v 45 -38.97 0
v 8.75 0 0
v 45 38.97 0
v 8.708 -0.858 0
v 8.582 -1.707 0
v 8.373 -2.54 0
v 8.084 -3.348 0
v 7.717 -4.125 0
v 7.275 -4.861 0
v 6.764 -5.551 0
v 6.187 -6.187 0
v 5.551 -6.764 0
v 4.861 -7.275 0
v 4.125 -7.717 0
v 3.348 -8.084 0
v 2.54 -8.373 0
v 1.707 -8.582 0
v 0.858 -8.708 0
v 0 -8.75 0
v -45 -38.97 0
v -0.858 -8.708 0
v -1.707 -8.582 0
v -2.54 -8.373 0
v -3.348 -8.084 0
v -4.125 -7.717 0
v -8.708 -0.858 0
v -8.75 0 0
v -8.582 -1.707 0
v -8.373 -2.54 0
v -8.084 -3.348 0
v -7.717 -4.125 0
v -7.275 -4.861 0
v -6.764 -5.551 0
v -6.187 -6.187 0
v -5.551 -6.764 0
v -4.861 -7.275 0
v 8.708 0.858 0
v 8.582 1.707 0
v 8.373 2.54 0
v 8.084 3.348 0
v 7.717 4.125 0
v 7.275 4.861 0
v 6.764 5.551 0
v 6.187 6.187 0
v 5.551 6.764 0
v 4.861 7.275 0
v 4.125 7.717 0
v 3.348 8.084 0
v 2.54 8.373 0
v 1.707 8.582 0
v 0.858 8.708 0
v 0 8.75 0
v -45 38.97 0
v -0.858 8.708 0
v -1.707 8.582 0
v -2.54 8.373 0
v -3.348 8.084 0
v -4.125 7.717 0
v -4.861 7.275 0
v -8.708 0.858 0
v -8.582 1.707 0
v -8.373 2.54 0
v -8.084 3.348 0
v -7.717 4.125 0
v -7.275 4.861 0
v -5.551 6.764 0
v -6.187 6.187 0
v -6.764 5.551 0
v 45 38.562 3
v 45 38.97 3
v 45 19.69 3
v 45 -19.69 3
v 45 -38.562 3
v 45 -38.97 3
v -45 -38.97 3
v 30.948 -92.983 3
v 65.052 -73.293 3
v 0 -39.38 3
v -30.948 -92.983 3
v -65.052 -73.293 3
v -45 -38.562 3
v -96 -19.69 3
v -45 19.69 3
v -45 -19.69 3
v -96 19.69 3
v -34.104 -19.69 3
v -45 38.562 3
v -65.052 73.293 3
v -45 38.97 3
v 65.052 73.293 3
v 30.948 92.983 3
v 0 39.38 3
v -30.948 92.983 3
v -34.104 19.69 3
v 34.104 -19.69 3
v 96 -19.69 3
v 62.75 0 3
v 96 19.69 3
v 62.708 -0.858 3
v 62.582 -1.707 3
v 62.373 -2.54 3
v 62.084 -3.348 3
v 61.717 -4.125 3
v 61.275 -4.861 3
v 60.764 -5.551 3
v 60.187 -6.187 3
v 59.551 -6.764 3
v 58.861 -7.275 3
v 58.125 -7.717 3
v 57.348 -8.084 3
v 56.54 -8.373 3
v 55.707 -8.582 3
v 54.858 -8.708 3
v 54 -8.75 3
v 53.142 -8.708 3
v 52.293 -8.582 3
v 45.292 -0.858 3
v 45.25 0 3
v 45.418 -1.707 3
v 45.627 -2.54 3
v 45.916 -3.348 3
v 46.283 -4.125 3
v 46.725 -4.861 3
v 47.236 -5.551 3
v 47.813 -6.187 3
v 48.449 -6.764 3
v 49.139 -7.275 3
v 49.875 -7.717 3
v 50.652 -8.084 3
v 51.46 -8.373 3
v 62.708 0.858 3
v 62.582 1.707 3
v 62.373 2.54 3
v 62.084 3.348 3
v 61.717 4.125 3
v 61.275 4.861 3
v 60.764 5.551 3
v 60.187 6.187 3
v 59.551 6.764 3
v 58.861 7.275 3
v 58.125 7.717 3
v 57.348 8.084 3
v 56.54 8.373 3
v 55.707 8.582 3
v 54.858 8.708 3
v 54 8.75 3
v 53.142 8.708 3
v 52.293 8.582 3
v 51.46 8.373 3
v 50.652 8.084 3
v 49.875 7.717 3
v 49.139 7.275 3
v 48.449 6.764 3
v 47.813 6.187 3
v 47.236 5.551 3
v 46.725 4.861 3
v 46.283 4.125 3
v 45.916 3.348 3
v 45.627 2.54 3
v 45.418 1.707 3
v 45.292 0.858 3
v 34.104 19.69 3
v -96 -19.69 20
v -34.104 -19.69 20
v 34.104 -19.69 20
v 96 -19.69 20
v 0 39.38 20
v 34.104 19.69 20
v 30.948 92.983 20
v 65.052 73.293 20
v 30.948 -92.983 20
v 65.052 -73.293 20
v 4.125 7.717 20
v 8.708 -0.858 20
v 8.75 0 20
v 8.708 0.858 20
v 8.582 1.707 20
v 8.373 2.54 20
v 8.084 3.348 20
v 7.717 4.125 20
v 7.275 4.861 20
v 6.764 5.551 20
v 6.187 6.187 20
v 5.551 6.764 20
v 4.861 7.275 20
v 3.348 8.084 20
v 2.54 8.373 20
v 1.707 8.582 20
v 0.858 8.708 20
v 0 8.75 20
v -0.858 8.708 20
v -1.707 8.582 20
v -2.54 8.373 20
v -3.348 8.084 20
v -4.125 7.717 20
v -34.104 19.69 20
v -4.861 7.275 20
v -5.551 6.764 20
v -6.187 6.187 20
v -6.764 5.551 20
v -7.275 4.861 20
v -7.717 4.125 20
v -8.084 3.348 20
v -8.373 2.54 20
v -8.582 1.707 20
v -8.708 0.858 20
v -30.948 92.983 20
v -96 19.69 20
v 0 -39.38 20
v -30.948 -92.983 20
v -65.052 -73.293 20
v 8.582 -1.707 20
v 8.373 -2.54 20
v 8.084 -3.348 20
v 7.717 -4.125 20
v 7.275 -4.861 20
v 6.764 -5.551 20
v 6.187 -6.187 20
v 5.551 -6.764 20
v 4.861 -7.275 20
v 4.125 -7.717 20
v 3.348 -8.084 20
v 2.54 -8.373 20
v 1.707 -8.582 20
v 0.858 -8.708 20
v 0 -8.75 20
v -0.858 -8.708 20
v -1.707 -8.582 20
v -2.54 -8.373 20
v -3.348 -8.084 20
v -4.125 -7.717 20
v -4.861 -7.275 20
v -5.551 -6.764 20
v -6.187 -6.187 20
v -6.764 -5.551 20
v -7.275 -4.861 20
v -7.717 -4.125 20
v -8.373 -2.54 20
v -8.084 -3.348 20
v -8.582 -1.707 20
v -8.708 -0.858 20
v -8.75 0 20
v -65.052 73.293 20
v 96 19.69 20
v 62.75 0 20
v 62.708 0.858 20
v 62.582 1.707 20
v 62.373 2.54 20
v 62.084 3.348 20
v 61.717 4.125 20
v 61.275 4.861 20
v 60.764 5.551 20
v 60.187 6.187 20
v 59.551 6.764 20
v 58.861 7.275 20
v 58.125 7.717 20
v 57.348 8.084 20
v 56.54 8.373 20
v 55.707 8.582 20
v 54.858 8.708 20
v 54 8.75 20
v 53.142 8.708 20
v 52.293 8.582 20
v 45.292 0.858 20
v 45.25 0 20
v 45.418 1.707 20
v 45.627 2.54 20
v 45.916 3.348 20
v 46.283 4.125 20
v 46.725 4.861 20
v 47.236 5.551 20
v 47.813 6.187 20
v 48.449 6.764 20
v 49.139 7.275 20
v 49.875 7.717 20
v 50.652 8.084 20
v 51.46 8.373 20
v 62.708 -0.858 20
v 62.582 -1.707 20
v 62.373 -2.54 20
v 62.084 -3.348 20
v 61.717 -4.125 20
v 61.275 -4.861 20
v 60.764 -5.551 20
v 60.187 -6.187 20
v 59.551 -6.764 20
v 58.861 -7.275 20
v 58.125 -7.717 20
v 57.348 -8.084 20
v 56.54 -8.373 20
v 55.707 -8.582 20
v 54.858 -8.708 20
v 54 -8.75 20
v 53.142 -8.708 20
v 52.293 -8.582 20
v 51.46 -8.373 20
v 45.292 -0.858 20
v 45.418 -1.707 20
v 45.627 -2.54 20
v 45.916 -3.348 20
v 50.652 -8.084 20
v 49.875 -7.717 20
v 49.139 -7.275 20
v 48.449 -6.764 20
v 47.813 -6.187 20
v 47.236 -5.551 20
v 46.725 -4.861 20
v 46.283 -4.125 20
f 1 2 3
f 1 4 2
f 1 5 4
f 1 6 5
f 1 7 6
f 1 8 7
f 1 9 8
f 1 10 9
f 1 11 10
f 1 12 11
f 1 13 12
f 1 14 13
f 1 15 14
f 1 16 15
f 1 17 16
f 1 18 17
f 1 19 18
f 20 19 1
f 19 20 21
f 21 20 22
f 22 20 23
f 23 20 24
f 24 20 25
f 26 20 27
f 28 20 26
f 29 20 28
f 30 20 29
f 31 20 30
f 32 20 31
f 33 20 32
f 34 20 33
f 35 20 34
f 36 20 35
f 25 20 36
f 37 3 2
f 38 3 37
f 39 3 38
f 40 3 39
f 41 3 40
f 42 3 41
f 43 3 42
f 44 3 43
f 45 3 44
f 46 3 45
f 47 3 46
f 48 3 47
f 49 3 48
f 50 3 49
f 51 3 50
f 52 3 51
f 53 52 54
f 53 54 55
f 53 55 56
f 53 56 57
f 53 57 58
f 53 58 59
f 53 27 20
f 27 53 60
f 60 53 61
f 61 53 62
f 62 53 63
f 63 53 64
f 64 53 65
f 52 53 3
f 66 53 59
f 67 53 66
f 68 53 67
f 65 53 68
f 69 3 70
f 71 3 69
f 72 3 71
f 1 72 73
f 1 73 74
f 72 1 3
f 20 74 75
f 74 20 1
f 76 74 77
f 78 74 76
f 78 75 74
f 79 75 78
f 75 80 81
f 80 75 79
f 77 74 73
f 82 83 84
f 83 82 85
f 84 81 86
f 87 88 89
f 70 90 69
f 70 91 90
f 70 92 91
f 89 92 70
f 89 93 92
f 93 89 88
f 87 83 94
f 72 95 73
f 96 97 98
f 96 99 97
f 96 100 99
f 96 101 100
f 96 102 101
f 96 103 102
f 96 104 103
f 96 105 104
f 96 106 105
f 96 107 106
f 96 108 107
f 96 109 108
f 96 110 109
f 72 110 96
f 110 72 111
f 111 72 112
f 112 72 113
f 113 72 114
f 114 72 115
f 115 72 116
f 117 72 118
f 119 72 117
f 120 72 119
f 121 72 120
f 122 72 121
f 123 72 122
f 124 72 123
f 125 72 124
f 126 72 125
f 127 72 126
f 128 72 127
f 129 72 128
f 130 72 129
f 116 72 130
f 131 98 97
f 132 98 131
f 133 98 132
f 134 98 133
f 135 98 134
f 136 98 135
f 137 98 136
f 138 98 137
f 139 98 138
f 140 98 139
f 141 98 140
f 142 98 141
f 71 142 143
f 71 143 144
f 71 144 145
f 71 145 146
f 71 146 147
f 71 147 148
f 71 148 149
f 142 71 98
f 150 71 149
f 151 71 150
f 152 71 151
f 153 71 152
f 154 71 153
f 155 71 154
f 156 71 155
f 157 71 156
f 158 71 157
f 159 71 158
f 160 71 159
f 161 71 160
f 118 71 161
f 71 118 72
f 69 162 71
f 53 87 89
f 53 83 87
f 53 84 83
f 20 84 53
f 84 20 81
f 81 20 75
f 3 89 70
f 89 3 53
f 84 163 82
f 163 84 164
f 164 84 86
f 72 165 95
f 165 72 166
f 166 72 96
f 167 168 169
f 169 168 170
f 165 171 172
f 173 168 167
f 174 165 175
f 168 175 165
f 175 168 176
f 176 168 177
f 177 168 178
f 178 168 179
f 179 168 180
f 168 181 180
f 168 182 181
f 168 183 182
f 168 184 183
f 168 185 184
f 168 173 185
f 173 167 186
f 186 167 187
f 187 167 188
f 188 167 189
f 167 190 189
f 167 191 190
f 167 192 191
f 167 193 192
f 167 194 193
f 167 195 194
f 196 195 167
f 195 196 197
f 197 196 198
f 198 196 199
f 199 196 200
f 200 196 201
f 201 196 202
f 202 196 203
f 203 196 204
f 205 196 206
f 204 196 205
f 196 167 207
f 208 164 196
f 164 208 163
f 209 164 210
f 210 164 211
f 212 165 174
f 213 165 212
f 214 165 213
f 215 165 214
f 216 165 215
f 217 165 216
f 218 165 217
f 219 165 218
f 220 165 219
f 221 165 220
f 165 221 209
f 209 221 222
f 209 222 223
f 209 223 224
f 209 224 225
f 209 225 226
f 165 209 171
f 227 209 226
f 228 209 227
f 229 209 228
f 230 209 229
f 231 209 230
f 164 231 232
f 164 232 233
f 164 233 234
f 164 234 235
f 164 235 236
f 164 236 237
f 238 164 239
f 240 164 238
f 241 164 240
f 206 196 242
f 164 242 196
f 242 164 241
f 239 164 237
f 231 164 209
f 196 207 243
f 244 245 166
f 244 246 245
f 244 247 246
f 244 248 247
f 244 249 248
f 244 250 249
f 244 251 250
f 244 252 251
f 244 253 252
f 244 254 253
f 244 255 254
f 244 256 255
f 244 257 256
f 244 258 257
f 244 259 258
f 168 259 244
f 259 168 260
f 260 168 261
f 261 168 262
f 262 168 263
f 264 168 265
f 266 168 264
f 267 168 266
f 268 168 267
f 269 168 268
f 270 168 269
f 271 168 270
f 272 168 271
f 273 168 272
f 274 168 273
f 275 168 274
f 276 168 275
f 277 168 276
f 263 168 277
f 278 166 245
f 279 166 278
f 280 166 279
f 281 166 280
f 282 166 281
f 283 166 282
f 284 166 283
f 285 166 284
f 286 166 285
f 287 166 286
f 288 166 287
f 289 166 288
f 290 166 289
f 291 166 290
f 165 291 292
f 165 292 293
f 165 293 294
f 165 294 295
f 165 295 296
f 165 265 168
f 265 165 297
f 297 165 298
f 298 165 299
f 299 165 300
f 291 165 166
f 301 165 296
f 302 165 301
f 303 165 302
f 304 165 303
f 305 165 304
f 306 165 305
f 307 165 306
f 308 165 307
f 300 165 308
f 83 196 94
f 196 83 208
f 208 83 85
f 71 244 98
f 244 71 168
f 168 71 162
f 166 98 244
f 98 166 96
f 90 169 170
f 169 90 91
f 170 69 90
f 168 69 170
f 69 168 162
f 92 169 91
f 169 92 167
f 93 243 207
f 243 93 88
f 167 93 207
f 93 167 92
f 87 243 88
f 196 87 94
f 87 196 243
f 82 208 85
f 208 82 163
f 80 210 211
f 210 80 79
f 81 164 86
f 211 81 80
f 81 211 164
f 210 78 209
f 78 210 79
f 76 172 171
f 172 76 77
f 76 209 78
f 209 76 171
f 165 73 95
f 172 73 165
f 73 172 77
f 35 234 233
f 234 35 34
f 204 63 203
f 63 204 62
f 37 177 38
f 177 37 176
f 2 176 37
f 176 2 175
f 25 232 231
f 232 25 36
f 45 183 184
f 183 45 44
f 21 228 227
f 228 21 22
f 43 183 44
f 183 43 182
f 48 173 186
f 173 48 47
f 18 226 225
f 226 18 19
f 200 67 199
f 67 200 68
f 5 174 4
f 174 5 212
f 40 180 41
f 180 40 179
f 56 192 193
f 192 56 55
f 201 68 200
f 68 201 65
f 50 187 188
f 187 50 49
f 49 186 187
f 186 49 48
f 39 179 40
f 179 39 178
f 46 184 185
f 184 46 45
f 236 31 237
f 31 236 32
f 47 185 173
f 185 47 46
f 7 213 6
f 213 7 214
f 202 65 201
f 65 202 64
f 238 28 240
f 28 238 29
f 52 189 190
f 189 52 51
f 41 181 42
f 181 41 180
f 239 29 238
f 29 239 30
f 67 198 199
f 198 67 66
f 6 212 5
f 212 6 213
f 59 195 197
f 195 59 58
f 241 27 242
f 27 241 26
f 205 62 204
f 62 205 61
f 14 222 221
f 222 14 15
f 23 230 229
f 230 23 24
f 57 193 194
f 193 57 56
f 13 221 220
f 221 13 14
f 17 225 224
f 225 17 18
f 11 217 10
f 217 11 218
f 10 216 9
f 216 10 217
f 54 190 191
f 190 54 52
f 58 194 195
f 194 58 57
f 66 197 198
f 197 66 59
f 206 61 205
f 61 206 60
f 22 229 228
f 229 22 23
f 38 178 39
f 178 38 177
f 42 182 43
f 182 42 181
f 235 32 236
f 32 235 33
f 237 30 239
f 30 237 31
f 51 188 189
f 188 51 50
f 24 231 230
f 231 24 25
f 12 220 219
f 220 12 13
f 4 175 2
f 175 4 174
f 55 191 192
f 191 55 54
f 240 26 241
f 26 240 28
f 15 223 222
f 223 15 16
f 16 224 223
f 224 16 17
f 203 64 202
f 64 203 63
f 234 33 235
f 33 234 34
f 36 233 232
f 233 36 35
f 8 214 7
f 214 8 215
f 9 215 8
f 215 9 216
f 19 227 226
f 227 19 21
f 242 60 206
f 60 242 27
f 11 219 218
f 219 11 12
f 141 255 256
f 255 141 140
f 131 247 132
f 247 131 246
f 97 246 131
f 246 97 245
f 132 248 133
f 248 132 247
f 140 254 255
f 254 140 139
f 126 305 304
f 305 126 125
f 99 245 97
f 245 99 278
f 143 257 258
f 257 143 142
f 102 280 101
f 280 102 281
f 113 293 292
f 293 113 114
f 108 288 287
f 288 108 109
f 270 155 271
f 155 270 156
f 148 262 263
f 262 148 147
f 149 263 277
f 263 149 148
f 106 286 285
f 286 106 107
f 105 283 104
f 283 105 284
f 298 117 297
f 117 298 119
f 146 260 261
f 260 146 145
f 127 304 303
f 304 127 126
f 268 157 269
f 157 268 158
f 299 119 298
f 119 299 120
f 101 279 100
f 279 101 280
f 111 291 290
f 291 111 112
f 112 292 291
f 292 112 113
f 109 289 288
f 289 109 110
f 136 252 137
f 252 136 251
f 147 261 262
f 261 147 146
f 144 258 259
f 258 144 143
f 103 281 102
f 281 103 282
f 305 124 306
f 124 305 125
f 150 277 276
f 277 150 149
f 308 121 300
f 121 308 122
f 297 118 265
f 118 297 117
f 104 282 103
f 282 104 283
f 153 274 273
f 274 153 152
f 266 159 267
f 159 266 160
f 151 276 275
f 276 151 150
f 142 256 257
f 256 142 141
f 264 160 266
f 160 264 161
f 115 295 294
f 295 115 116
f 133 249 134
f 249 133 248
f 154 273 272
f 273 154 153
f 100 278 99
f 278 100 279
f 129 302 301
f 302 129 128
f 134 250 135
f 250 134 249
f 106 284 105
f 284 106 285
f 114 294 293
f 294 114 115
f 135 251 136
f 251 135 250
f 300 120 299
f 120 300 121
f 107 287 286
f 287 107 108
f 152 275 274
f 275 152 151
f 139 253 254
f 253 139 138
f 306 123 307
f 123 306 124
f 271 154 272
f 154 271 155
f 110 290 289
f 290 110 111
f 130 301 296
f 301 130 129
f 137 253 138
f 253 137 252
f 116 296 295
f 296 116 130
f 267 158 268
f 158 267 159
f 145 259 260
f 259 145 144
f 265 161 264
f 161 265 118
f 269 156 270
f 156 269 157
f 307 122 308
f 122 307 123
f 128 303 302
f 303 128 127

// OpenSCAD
// Built by bench/smallmodels/features/compiler.py from a list of features.
$fn = 64;
difference() {
  union() {
    translate([0, 0, 0]) linear_extrude(height = 3) polygon([[-45, -38.97], [45, -38.97], [45, 38.97], [-45, 38.97]]);
    translate([0, 0, 3]) linear_extrude(height = 17) polygon([[-42, -19.69], [42, -19.69], [42, 19.69], [-42, 19.69]]);
    translate([54, 0, 3]) rotate([0, 0, 0]) linear_extrude(height = 17) polygon([[-42, -19.69], [42, -19.69], [42, 19.69], [-42, 19.69]]); translate([27, 46.7654, 3]) rotate([0, 0, 60]) linear_extrude(height = 17) polygon([[-42, -19.69], [42, -19.69], [42, 19.69], [-42, 19.69]]); translate([-27, 46.7654, 3]) rotate([0, 0, 120]) linear_extrude(height = 17) polygon([[-42, -19.69], [42, -19.69], [42, 19.69], [-42, 19.69]]); translate([-54, 0, 3]) rotate([0, 0, 180]) linear_extrude(height = 17) polygon([[-42, -19.69], [42, -19.69], [42, 19.69], [-42, 19.69]]); translate([-27, -46.7654, 3]) rotate([0, 0, 240]) linear_extrude(height = 17) polygon([[-42, -19.69], [42, -19.69], [42, 19.69], [-42, 19.69]]); translate([27, -46.7654, 3]) rotate([0, 0, 300]) linear_extrude(height = 17) polygon([[-42, -19.69], [42, -19.69], [42, 19.69], [-42, 19.69]]);
  }
  union() {
    translate([0, 0, -1]) rotate([0, 0, 0]) cylinder(d = 17.5, h = 22);
    translate([54, 0, -1]) rotate([0, 0, 0]) cylinder(d = 17.5, h = 22);
  }
}
